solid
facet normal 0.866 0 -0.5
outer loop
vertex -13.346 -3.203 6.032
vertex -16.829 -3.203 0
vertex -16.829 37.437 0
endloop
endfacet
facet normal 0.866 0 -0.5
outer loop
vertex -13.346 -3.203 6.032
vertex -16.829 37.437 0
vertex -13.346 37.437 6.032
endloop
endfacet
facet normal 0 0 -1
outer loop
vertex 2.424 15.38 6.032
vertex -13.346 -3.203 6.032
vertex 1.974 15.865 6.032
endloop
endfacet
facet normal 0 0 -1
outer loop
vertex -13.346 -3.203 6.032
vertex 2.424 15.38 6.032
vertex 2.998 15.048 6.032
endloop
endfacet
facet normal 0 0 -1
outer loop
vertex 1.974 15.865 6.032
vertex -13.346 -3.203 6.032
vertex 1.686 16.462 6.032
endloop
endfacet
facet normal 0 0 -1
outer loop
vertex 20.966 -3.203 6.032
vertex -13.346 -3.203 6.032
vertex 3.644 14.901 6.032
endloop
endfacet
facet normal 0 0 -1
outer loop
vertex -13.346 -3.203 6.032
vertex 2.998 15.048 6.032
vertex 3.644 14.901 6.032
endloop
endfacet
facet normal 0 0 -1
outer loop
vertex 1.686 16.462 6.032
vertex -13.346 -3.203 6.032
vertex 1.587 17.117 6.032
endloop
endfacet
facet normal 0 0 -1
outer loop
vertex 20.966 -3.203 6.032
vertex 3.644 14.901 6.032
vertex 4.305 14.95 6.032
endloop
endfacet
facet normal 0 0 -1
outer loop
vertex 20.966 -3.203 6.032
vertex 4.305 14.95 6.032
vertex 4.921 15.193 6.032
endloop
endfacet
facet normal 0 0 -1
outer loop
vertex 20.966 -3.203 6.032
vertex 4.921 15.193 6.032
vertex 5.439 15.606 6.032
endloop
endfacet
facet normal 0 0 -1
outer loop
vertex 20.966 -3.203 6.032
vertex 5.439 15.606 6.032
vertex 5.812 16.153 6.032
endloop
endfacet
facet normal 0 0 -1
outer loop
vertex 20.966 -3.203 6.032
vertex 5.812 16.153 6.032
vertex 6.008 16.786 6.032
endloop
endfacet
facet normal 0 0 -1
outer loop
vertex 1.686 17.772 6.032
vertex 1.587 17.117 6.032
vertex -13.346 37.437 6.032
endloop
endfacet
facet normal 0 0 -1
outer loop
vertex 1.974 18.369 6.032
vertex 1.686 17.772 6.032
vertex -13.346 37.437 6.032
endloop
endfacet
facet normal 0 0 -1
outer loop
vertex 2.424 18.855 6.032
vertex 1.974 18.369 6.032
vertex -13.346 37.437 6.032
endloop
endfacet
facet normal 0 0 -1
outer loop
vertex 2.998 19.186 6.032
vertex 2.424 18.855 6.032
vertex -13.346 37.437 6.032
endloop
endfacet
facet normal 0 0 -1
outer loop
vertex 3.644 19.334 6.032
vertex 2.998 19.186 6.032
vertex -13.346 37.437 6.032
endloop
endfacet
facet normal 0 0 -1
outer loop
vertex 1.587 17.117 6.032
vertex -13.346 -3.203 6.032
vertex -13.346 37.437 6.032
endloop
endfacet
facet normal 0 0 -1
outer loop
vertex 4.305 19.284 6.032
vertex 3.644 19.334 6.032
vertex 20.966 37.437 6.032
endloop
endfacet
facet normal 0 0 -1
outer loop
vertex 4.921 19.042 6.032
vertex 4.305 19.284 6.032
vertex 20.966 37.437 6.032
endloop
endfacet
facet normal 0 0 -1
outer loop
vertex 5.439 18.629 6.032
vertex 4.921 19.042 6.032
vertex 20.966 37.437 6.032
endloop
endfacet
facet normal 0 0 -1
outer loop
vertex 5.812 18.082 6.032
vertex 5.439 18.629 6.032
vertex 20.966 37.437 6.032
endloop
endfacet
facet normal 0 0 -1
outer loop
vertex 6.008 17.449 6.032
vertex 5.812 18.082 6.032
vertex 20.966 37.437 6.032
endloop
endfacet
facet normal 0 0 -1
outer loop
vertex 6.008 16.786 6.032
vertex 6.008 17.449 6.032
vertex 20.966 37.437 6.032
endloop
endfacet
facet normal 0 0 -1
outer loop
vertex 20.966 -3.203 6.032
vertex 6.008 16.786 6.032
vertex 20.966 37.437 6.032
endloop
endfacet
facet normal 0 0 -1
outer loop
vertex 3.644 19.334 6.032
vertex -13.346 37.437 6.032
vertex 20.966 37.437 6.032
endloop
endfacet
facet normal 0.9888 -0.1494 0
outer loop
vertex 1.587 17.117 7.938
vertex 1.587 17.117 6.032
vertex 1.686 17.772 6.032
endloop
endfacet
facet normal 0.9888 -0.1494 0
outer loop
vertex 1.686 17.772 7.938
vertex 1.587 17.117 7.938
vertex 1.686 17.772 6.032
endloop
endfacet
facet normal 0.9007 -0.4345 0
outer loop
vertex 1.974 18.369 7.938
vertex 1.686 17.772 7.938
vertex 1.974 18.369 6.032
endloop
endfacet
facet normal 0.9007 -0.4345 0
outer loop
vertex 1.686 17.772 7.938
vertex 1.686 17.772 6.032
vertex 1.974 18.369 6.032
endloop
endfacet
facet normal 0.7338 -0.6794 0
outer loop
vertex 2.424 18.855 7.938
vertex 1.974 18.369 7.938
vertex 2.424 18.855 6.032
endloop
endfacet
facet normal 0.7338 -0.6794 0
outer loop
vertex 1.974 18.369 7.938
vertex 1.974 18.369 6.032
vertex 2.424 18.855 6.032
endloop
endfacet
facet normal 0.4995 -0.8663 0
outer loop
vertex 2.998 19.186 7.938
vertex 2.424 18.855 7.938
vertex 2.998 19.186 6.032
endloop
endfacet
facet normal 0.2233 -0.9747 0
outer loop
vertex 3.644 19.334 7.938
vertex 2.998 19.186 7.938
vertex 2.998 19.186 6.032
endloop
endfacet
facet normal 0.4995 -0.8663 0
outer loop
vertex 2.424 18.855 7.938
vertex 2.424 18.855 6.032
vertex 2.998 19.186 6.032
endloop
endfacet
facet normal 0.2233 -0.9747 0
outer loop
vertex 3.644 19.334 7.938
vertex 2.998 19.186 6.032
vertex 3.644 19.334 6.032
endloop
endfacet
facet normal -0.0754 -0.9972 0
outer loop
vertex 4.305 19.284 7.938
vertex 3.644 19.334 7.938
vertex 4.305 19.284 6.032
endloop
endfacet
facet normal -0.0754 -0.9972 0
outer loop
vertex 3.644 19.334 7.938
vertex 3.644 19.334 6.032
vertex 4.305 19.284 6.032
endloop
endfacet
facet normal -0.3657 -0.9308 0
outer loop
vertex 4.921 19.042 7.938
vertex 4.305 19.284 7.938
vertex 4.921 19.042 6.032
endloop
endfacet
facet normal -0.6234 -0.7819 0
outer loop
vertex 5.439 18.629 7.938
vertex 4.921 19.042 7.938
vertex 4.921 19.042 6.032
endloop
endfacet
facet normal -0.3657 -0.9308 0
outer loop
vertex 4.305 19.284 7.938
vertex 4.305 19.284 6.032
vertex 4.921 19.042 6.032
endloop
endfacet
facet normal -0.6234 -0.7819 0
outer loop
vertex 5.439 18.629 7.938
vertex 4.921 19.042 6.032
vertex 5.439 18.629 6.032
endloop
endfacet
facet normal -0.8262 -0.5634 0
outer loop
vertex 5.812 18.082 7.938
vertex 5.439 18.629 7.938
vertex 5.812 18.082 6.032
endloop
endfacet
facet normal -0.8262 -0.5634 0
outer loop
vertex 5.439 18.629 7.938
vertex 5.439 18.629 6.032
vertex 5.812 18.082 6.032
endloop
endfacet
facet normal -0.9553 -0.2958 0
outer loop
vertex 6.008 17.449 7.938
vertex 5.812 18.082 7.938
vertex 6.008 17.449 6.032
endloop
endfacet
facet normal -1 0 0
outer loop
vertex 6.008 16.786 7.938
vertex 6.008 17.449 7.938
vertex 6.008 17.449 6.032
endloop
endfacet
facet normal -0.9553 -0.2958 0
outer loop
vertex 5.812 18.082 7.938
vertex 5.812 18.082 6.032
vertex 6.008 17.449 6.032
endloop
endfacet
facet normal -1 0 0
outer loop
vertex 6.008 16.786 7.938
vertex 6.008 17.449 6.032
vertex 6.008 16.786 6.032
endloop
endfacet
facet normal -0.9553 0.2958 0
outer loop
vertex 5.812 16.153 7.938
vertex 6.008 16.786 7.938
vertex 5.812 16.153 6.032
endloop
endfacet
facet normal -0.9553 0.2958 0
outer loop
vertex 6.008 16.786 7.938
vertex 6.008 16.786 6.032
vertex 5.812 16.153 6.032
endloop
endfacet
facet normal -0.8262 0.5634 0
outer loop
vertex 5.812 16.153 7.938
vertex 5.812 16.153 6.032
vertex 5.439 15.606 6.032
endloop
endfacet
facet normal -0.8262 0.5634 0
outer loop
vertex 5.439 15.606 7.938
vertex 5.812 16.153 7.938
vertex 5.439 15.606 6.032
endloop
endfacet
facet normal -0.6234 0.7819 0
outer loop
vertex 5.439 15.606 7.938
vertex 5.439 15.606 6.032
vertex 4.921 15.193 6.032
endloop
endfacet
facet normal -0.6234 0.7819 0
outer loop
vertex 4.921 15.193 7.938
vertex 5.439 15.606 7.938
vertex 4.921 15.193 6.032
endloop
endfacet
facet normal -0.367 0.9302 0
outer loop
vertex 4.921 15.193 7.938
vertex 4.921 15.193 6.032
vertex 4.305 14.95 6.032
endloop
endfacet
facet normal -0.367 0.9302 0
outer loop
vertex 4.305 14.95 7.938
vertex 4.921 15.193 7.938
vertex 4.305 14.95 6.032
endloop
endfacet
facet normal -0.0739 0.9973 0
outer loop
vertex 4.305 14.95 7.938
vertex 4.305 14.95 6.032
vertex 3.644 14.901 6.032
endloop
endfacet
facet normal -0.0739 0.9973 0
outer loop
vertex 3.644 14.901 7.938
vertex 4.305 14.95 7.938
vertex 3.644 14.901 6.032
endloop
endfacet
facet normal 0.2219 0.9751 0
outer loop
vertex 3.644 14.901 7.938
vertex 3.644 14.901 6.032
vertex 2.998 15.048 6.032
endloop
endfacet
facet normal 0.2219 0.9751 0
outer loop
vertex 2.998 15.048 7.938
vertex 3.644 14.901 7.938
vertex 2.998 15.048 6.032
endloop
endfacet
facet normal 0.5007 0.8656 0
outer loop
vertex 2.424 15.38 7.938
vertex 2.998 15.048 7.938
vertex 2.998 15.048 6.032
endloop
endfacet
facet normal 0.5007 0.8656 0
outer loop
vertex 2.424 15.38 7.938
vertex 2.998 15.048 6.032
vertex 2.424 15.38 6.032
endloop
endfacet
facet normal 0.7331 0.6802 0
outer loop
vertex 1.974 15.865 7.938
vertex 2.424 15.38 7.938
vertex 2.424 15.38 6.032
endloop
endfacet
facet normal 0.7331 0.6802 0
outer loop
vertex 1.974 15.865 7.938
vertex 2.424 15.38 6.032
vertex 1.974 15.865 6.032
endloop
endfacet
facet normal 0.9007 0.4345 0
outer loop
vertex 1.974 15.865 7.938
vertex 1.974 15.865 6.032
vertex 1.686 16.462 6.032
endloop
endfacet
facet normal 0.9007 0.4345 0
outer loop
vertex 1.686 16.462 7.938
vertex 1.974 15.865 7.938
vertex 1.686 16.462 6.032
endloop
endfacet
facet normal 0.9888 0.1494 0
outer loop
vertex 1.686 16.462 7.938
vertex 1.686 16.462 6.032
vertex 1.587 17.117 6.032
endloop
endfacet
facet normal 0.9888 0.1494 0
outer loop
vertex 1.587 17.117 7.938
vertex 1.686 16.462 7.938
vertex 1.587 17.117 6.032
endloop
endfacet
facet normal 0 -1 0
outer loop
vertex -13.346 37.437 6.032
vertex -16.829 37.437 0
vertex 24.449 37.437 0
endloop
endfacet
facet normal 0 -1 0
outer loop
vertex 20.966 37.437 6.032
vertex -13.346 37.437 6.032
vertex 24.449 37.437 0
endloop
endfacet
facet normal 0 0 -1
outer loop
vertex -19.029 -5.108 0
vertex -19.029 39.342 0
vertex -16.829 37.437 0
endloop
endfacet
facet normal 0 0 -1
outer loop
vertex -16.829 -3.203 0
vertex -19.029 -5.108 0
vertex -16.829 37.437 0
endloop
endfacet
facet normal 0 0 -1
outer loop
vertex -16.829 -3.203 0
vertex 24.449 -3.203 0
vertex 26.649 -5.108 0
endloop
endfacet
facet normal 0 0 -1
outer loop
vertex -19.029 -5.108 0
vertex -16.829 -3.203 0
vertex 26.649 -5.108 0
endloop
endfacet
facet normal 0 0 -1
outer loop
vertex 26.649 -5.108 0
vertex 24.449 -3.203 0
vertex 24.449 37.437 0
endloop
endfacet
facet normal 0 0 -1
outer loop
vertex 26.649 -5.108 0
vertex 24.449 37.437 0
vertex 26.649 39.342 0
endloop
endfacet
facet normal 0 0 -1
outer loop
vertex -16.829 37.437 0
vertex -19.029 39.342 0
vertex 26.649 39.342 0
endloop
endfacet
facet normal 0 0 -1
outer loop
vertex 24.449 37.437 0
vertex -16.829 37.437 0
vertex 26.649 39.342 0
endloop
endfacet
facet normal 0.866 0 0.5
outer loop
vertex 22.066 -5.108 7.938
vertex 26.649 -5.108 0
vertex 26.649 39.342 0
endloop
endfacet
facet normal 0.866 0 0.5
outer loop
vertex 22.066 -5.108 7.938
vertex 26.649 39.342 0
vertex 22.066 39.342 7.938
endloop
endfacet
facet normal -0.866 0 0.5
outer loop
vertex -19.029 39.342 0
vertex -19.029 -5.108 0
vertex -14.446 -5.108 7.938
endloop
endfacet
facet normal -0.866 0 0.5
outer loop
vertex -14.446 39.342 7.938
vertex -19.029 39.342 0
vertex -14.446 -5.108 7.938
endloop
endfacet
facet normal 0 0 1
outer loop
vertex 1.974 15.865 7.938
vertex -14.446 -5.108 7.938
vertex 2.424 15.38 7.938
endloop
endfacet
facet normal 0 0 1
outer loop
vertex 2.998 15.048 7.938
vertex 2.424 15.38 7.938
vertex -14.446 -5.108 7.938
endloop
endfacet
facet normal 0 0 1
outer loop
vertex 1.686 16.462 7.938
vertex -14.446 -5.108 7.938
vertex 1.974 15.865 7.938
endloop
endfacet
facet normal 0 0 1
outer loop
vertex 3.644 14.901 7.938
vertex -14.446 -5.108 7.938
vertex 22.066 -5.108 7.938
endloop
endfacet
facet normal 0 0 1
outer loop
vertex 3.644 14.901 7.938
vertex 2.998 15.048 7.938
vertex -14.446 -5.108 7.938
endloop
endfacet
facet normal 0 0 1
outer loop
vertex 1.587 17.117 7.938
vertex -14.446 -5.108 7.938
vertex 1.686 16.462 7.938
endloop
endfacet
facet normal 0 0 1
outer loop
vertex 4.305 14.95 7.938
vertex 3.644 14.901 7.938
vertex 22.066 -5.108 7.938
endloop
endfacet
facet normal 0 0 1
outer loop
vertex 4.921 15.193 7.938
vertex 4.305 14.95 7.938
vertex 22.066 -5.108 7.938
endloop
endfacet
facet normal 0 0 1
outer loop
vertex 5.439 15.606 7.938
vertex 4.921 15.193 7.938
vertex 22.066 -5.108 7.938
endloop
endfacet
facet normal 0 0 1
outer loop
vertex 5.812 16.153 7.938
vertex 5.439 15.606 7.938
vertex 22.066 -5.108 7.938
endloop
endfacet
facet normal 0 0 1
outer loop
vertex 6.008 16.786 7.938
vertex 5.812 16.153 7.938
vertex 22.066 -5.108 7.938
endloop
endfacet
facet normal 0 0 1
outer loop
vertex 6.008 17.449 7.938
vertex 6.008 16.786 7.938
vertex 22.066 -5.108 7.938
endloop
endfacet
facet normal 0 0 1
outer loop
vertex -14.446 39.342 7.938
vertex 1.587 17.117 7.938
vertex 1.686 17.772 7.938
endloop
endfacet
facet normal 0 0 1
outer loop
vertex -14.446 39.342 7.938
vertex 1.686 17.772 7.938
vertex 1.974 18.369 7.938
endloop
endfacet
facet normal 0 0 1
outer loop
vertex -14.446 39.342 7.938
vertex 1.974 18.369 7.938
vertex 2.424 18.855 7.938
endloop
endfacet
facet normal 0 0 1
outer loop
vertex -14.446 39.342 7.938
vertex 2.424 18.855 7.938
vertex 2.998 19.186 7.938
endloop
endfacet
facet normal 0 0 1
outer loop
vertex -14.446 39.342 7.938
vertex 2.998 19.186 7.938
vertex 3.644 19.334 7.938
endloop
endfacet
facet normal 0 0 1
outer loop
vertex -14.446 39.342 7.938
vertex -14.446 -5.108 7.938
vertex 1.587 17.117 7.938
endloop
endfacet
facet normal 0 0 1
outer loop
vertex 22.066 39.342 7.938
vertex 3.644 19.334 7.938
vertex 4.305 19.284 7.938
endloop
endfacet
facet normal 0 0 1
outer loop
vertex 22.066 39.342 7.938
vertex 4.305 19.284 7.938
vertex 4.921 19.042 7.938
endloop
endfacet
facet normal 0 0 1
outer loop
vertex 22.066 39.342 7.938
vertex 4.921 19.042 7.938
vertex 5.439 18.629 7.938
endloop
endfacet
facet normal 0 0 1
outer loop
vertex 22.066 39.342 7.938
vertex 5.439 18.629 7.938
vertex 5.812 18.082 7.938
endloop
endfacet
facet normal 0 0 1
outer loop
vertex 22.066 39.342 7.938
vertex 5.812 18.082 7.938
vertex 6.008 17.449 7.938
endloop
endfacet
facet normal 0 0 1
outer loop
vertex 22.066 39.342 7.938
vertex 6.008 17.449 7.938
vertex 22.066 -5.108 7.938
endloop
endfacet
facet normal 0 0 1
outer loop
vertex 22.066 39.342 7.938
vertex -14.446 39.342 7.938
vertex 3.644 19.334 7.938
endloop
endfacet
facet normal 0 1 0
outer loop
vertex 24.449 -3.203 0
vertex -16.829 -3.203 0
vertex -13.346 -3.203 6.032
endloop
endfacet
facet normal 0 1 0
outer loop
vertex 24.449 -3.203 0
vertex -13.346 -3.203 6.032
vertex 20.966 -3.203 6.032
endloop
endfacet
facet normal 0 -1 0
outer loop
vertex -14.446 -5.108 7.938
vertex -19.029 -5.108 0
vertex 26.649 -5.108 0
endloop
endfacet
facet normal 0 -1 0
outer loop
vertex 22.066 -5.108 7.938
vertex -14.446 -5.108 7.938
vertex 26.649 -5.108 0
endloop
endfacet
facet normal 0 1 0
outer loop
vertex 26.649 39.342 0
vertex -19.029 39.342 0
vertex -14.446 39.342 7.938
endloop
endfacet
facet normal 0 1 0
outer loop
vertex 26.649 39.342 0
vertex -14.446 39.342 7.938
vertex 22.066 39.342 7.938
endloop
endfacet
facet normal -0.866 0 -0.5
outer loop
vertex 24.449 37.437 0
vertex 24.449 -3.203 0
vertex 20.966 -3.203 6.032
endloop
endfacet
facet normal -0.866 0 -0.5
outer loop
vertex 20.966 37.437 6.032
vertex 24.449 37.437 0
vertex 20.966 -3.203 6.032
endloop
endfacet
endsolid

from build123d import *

# Parameters (mm, degrees)
F0_W        = 46.0375
F0_H        = 44.45
F1_DEPTH    = 7.9375
F2_T1_DEPTH = 87.1311818198
F3_T        = -1.905
F5_D        = 4.445


# Not quite as in the source:
# - a fillet or chamfer that OpenCascade refuses, or shapes differently, is made with other operations: its cross-section is extruded or revolved along the edge and cut away or added


with BuildPart() as f1:
    # F0 (on Top) → F1 (new body)
    with BuildSketch(Plane.XY):
        with Locations((3.8099996746, 17.1172746531)):
            Rectangle(F0_W, F0_H)
    extrude(amount=F1_DEPTH)

    # F2: chamfer of 4.7625 x 8.248891971 on 2 edges, made by hand

    # F2_s2 → F2_t1 (cut)
    with BuildSketch(Plane.XZ.offset(-60.682865563)):
        Polygon((-19.2087503254, -0.311391971), (-14.4462503254, 7.9375), (-19.2087503254, 7.9375), align=None)
        Polygon((26.8287496746, -0.311391971), (22.0662496746, 7.9375), (26.8287496746, 7.9375), align=None)
    extrude(amount=F2_T1_DEPTH, mode=Mode.SUBTRACT)

    # F3
    f3_openings = [f1.faces().sort_by_distance(p)[0] for p in [
        (3.81, 17.117275, 0),
    ]]
    offset(amount=F3_T, openings=f3_openings)

    # F5 (through all)
    with Locations(Plane.XY.offset(7.9375)):
        with Locations((3.8099996746, 17.1172746531)):
            Hole(F5_D / 2)


solid = f1.part
